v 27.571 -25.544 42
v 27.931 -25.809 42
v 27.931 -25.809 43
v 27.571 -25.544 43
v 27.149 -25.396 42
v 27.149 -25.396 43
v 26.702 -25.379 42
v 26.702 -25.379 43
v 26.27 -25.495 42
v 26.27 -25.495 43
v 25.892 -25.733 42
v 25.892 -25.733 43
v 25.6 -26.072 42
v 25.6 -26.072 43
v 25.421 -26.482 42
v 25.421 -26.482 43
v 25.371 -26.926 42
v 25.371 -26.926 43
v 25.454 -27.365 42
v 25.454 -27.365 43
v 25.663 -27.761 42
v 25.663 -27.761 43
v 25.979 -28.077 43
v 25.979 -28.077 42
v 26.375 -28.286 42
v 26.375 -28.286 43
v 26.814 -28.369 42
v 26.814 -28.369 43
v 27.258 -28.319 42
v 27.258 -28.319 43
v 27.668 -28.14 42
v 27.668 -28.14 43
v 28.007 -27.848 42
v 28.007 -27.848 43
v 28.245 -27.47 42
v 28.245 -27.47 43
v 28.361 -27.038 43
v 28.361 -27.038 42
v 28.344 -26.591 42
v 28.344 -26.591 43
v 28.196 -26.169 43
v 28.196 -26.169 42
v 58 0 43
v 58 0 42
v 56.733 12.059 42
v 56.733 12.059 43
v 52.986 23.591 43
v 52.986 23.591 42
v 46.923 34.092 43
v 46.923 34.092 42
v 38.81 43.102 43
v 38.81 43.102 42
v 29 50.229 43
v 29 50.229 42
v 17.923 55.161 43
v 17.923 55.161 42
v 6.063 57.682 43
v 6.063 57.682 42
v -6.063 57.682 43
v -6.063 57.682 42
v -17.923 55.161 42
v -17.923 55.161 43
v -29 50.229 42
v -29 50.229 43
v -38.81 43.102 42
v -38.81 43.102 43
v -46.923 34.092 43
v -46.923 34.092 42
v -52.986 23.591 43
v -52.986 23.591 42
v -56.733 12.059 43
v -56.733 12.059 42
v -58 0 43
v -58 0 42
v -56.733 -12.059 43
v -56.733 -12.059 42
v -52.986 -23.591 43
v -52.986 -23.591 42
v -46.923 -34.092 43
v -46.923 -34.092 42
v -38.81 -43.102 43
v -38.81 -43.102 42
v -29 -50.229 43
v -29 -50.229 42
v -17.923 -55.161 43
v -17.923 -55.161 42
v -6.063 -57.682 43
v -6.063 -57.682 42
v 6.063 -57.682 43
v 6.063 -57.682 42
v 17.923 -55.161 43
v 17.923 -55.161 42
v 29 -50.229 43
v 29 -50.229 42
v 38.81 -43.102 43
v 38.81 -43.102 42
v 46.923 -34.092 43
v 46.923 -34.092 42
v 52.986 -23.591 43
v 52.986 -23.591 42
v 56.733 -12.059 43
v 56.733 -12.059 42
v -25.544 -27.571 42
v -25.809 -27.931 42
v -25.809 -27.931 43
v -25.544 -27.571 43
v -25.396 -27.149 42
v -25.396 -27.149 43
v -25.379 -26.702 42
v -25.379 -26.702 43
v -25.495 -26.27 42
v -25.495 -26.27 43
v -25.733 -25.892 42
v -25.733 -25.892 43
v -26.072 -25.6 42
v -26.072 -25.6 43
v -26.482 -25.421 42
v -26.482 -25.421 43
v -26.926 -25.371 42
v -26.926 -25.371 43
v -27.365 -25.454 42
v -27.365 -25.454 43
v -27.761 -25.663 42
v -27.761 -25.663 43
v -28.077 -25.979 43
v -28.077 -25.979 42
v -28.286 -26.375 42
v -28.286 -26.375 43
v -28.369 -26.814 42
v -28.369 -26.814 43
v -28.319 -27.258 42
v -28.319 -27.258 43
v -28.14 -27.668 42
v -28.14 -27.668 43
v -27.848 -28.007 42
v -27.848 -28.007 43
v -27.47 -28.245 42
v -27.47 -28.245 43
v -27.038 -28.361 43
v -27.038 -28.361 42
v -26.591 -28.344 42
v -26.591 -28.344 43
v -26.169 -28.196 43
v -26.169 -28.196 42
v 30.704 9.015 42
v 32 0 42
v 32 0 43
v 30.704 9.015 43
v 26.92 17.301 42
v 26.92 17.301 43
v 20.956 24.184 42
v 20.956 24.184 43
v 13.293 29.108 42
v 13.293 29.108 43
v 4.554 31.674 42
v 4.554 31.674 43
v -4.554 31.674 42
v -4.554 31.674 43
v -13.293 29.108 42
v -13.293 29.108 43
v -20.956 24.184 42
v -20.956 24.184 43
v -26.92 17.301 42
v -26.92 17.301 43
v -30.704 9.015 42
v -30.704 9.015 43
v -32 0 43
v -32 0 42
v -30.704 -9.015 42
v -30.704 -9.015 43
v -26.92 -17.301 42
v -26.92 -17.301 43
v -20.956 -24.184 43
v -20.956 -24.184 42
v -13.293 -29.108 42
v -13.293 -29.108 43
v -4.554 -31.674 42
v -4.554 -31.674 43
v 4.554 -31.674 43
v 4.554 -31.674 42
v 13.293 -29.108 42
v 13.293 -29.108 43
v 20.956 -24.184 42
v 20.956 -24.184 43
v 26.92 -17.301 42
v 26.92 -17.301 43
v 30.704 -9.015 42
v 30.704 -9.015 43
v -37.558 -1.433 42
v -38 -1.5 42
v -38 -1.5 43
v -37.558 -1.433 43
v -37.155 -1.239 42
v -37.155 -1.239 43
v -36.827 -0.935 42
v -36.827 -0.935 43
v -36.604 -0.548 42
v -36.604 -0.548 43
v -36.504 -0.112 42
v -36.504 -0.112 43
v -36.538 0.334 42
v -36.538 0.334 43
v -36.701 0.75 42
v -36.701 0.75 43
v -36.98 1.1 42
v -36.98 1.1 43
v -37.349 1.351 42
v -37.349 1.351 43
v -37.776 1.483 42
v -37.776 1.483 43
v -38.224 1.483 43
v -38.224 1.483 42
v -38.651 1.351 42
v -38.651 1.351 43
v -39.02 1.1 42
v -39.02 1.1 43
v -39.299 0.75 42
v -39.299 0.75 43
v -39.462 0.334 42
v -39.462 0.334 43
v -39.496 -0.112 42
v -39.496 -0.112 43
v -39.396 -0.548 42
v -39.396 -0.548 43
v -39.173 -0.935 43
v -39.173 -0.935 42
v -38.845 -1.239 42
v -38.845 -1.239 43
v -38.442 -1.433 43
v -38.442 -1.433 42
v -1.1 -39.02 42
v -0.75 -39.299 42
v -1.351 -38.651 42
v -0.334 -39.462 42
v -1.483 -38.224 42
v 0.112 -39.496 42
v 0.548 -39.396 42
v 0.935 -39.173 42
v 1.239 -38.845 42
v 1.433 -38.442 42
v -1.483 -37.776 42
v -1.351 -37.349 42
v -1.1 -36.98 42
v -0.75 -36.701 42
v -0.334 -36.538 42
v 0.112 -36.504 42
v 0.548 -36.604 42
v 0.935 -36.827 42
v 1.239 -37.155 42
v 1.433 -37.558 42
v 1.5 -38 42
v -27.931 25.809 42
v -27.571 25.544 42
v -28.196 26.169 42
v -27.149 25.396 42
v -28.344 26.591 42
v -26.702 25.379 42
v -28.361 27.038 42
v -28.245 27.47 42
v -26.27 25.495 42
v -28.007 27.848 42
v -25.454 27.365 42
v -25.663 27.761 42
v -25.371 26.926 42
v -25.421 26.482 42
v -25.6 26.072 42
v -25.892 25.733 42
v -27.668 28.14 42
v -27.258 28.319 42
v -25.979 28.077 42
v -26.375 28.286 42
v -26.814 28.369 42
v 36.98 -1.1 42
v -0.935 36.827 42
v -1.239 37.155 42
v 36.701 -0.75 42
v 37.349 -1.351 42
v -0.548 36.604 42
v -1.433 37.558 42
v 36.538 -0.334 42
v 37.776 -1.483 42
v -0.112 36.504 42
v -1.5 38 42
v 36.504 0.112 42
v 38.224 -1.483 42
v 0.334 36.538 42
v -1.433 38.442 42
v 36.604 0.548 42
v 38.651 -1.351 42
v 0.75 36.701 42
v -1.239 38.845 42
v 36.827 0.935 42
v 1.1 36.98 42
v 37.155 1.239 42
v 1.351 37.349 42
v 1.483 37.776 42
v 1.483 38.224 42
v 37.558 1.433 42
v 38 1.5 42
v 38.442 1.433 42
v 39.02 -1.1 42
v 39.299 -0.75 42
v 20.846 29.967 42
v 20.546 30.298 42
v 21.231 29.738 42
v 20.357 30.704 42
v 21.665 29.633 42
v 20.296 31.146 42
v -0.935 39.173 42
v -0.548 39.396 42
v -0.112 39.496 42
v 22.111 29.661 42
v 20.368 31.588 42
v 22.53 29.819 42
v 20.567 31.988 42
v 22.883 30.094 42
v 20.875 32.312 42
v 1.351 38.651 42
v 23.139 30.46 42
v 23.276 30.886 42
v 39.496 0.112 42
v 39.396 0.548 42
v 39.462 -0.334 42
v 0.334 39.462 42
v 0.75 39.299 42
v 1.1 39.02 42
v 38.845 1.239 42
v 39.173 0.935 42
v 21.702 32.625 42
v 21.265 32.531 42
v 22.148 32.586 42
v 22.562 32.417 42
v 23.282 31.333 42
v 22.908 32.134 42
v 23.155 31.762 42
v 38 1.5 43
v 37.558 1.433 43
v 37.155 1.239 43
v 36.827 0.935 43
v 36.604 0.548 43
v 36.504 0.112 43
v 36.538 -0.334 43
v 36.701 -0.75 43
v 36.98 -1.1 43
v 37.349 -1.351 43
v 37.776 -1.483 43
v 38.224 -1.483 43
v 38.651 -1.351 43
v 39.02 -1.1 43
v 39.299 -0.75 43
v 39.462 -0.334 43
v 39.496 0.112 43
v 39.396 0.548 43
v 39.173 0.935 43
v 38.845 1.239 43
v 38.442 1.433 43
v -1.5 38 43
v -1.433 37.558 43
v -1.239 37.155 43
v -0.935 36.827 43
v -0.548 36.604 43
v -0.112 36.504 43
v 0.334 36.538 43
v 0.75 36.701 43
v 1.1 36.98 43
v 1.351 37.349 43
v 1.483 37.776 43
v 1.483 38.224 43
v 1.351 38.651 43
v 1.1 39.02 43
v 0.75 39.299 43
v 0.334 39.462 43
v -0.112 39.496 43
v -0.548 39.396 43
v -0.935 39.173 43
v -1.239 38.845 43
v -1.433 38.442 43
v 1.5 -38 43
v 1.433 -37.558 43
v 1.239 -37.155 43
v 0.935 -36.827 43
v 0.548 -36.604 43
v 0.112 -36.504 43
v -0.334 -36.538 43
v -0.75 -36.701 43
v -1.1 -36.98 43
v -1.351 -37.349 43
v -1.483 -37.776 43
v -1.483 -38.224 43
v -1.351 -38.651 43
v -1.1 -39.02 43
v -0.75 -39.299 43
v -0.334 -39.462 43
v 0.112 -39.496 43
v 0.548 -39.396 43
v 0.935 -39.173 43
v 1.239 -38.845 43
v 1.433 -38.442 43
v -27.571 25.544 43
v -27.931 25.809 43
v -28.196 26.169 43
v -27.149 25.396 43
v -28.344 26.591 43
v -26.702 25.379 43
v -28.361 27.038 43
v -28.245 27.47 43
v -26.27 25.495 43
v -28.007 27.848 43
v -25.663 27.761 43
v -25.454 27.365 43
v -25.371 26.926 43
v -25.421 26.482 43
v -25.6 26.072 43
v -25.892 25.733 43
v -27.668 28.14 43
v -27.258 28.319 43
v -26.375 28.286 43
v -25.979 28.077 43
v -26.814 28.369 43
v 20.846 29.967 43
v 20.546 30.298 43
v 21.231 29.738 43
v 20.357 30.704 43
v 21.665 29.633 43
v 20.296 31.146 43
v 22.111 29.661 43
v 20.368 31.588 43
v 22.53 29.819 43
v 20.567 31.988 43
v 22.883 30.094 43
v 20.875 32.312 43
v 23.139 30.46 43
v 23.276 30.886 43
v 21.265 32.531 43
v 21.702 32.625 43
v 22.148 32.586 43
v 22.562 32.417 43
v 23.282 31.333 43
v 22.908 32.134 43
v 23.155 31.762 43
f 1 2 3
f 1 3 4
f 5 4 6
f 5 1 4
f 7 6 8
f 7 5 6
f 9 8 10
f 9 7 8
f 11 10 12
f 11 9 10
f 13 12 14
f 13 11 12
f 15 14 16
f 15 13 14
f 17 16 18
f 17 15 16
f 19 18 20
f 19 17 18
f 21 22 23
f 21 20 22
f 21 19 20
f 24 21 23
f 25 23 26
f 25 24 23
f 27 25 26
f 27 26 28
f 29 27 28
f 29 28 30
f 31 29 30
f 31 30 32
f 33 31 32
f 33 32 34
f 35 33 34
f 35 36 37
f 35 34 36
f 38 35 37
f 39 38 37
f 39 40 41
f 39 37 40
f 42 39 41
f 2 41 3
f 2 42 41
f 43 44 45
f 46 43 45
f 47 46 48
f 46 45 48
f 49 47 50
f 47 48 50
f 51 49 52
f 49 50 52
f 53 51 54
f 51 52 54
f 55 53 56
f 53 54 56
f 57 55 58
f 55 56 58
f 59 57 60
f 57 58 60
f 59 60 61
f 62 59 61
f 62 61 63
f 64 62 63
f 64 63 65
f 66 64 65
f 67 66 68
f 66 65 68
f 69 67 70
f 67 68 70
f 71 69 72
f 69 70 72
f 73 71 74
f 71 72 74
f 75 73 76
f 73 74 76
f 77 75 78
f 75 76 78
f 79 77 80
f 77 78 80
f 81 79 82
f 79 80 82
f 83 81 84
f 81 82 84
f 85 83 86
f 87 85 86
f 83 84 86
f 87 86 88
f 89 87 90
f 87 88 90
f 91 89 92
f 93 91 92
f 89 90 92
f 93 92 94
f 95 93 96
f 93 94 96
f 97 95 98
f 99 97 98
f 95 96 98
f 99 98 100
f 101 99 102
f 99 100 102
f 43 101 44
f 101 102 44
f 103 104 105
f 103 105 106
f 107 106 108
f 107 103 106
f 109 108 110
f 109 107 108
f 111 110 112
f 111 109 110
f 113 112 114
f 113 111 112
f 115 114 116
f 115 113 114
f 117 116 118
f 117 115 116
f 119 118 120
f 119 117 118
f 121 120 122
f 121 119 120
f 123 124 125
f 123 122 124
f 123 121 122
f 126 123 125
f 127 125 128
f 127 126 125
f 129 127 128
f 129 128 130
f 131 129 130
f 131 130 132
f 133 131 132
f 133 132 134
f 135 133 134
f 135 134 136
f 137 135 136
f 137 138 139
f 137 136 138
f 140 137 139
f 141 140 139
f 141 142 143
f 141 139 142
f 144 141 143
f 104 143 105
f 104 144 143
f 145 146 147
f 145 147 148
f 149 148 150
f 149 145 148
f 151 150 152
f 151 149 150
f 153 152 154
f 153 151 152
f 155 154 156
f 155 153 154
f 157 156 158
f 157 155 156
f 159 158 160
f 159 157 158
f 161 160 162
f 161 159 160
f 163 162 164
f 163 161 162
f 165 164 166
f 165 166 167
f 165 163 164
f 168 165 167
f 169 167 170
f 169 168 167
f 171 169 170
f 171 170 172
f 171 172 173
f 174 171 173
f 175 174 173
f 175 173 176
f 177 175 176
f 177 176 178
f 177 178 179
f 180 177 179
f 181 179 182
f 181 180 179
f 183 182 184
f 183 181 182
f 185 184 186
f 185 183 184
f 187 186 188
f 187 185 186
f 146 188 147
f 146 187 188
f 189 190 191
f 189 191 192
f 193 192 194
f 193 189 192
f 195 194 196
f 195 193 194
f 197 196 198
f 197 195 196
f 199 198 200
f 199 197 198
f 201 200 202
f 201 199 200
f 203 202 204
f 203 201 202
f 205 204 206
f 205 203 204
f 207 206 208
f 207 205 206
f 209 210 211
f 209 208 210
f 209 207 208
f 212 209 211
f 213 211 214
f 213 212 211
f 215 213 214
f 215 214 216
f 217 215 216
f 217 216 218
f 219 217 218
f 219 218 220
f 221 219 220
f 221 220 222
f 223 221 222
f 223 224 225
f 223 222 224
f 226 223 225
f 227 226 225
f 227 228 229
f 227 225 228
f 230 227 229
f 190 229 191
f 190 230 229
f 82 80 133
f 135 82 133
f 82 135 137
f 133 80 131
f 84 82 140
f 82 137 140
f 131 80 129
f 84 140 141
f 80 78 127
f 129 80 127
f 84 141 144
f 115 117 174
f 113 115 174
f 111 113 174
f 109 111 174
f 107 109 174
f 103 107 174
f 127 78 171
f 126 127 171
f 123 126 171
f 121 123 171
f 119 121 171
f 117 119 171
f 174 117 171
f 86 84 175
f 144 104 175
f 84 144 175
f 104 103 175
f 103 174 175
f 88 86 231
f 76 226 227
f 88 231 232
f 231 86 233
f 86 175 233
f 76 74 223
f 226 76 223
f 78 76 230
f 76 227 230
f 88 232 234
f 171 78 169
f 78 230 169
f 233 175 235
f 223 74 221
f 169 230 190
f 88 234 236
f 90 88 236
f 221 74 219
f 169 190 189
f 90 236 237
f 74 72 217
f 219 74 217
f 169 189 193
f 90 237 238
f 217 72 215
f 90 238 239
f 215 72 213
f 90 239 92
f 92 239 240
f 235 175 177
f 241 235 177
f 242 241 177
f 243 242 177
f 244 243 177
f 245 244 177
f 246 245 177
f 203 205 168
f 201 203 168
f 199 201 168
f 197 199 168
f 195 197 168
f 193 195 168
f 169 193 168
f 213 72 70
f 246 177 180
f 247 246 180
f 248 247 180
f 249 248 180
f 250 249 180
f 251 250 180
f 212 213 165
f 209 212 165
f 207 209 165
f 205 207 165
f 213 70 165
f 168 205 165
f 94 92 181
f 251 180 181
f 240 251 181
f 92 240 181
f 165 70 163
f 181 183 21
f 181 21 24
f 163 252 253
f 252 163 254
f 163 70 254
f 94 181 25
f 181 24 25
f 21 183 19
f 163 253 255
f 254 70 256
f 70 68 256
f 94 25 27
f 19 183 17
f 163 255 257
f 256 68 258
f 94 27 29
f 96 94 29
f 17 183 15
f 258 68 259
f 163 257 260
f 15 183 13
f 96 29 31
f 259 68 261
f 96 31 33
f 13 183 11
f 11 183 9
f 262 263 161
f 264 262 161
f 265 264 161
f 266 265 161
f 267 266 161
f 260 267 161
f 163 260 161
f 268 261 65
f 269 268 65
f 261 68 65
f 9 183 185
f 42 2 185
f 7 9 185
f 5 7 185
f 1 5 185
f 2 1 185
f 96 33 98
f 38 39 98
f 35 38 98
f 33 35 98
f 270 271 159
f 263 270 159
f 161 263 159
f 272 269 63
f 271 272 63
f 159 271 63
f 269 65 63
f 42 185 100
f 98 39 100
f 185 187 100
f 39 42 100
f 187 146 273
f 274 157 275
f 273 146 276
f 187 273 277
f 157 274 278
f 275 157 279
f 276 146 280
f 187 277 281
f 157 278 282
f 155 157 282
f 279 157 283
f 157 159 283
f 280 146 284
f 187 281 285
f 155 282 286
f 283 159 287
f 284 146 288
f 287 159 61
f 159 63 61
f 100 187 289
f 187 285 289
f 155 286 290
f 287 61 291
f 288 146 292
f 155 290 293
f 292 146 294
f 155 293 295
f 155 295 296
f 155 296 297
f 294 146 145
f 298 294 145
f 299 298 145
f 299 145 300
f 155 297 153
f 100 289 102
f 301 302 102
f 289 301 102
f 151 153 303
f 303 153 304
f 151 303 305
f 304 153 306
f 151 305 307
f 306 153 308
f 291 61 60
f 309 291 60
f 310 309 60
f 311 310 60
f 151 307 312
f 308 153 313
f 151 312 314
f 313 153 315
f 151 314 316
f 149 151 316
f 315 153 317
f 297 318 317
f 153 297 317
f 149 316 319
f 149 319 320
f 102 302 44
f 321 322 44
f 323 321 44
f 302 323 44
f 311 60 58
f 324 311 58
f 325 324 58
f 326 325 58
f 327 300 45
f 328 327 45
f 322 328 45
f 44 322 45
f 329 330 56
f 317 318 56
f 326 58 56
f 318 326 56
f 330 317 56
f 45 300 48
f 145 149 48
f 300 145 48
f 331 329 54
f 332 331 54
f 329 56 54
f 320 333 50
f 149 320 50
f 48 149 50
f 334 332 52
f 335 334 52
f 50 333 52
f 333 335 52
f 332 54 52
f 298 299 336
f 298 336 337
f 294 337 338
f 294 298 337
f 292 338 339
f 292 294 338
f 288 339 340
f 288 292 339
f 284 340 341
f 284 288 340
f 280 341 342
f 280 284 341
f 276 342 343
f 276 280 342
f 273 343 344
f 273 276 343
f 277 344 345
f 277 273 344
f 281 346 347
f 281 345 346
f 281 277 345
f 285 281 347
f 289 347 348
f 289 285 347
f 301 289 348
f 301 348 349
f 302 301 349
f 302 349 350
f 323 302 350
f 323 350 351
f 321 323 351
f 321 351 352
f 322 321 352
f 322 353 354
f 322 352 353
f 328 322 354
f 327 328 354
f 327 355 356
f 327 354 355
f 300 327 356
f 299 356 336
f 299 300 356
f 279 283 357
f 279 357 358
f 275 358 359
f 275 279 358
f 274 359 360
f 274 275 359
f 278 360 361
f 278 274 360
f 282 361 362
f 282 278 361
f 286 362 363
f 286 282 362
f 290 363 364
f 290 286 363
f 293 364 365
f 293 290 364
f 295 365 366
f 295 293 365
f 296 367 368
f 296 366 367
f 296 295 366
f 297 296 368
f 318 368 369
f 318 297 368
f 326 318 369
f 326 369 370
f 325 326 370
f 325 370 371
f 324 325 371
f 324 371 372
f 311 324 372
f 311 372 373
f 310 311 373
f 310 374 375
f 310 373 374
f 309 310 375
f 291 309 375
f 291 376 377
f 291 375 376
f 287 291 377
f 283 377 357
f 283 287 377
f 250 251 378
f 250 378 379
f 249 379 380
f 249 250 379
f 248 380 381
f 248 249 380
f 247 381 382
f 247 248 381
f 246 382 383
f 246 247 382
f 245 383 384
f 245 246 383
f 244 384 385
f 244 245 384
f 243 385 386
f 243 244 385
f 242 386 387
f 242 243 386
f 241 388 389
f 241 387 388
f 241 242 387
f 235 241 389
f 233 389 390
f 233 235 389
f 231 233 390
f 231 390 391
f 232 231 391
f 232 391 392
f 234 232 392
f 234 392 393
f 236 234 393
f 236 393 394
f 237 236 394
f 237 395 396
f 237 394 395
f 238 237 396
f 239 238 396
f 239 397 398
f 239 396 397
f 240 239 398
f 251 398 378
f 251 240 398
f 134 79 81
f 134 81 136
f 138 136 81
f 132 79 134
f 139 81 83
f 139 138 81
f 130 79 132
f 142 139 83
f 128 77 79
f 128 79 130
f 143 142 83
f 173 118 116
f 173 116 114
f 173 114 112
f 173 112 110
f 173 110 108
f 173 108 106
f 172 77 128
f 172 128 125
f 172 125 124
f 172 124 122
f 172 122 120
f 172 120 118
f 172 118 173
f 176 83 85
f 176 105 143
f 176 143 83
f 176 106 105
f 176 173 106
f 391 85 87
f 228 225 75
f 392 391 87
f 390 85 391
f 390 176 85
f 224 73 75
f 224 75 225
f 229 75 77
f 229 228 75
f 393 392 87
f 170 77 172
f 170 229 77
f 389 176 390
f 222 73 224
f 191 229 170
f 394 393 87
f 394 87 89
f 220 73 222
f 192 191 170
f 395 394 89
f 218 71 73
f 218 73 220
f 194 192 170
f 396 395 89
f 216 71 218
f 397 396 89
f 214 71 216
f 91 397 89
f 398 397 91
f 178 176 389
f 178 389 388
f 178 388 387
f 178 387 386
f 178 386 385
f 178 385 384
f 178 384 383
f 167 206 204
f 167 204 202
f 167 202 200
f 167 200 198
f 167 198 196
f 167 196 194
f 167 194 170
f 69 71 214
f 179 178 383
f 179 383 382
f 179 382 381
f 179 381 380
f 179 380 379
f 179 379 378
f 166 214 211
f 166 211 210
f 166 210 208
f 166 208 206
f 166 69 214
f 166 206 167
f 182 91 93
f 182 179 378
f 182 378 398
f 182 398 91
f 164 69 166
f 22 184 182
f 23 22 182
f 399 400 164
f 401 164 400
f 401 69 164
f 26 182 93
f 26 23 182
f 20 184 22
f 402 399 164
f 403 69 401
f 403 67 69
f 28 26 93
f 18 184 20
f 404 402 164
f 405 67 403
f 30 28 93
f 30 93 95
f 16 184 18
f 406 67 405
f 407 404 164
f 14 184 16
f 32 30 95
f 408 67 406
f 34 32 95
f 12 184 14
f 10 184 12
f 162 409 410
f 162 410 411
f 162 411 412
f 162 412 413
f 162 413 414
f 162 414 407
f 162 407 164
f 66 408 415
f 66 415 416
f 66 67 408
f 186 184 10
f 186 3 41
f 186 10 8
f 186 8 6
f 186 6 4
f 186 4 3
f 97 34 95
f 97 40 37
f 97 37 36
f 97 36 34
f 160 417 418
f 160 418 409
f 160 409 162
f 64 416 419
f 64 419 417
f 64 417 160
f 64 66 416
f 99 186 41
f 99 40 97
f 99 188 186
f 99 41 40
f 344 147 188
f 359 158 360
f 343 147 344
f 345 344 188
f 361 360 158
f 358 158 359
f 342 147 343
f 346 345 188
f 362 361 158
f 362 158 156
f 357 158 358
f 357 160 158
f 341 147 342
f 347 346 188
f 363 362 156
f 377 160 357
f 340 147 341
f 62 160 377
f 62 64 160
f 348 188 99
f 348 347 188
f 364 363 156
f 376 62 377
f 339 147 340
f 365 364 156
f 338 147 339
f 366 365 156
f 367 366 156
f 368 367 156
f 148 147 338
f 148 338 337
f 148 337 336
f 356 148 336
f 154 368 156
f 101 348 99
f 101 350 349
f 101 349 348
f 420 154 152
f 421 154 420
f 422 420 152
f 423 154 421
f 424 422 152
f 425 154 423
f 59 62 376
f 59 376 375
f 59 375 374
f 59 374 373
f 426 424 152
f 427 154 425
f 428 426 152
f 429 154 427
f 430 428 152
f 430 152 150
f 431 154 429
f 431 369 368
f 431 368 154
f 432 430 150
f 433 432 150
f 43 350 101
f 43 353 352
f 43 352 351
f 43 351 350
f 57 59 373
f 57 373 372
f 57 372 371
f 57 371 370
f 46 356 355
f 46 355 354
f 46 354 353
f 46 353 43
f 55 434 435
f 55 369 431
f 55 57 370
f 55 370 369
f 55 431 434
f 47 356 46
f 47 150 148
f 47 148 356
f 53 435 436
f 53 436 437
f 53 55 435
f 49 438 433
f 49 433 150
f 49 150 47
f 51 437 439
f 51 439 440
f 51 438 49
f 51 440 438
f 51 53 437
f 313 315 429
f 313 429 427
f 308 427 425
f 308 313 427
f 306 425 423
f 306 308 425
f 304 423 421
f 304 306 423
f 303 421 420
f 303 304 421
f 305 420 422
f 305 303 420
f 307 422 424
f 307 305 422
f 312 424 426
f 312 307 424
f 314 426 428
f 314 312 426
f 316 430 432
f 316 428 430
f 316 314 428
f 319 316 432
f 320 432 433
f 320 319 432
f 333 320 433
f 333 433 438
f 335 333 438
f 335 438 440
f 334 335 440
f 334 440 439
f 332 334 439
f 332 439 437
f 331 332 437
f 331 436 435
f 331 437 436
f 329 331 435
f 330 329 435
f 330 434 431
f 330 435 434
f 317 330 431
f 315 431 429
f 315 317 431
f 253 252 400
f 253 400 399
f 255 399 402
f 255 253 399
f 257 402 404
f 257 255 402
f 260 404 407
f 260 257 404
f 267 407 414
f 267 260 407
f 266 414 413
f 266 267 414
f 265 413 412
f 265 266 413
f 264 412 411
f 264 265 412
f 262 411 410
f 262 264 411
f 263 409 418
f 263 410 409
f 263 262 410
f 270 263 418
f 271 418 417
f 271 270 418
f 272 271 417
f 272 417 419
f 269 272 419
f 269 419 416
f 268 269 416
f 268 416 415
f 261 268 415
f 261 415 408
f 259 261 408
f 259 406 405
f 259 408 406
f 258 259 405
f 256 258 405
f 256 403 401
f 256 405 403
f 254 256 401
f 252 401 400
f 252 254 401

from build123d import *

# Parameters (mm, degrees)
CYLINDER2163_R               = 1.5
CYLINDER2163_DEPTH           = 100
CYLINDER2164_R               = 1.5
CYLINDER2164_DEPTH           = 100
CYLINDER2164_PLACEMENT_ANGLE = 145
CYLINDER2165_R               = 1.5
CYLINDER2165_DEPTH           = 100
CYLINDER2166_R               = 1.5
CYLINDER2166_DEPTH           = 100
CYLINDER2166_PLACEMENT_ANGLE = 225
CYLINDER2167_R               = 1.5
CYLINDER2167_DEPTH           = 100
CYLINDER2168_R               = 1.5
CYLINDER2168_DEPTH           = 100
CYLINDER2168_PLACEMENT_ANGLE = 45
CYLINDER2162_R               = 1.5
CYLINDER2162_DEPTH           = 100
CYLINDER2161_R               = 1.5
CYLINDER2161_DEPTH           = 100
CYLINDER2161_PLACEMENT_ANGLE = 45
TUBE089_R                    = 58
TUBE089_R_2                  = 32
TUBE089_DEPTH                = 1


with BuildPart() as v_lec2163:
    # Cylinder2163 → Cylinder2163 (new body)
    with BuildSketch(Plane(origin=(38, 0, 0), x_dir=(0, 1, 0), z_dir=(0, 0, 1))):
        Circle(CYLINDER2163_R)
    extrude(amount=CYLINDER2163_DEPTH)


with BuildPart() as v_lec2164:
    # Cylinder2164 → Cylinder2164 (new body)
    with BuildSketch(Plane.XY):
        Circle(CYLINDER2164_R)
    extrude(amount=CYLINDER2164_DEPTH)


with BuildPart() as v_lec2164_1:
    # Cylinder2164 placement: moved
    add(v_lec2164.part.moved(Location((21.795905, 31.127778, 0))).rotate(Axis((21.795905, 31.127778, 0), (0, 0, 1)), CYLINDER2164_PLACEMENT_ANGLE))


with BuildPart() as v_lec2165:
    # Cylinder2165 → Cylinder2165 (new body)
    with BuildSketch(Plane(origin=(0, 38, 0), x_dir=(-1, 0, 0), z_dir=(0, 0, 1))):
        Circle(CYLINDER2165_R)
    extrude(amount=CYLINDER2165_DEPTH)


with BuildPart() as v_lec2166:
    # Cylinder2166 → Cylinder2166 (new body)
    with BuildSketch(Plane.XY):
        Circle(CYLINDER2166_R)
    extrude(amount=CYLINDER2166_DEPTH)


with BuildPart() as v_lec2166_1:
    # Cylinder2166 placement: moved
    add(v_lec2166.part.moved(Location((-26.870058, 26.870058, 0))).rotate(Axis((-26.870058, 26.870058, 0), (0, 0, 1)), CYLINDER2166_PLACEMENT_ANGLE))


with BuildPart() as v_lec2167:
    # Cylinder2167 → Cylinder2167 (new body)
    with BuildSketch(Plane(origin=(-38, 0, 0), x_dir=(0, -1, 0), z_dir=(0, 0, 1))):
        Circle(CYLINDER2167_R)
    extrude(amount=CYLINDER2167_DEPTH)


with BuildPart() as v_lec2168:
    # Cylinder2168 → Cylinder2168 (new body)
    with BuildSketch(Plane.XY):
        Circle(CYLINDER2168_R)
    extrude(amount=CYLINDER2168_DEPTH)


with BuildPart() as v_lec2168_1:
    # Cylinder2168 placement: moved
    add(v_lec2168.part.moved(Location((-26.870058, -26.870058, 0))).rotate(Axis((-26.870058, -26.870058, 0), (0, 0, -1)), CYLINDER2168_PLACEMENT_ANGLE))


with BuildPart() as v_lec2162:
    # Cylinder2162 → Cylinder2162 (new body)
    with BuildSketch(Plane(origin=(0, -38, 0), x_dir=(1, 0, 0), z_dir=(0, 0, 1))):
        Circle(CYLINDER2162_R)
    extrude(amount=CYLINDER2162_DEPTH)


with BuildPart() as compound1127:
    # Cylinder2161 → Cylinder2161 (new body)
    with BuildSketch(Plane.XY):
        Circle(CYLINDER2161_R)
    extrude(amount=CYLINDER2161_DEPTH)


with BuildPart() as compound1127_1:
    # Cylinder2161 placement: moved
    add(compound1127.part.moved(Location((26.870058, -26.870058, 0))).rotate(Axis((26.870058, -26.870058, 0), (0, 0, 1)), CYLINDER2161_PLACEMENT_ANGLE))

    # Compound1127: union Válec2163, Válec2164, Válec2165, Válec2166, Válec2167, Válec2168, Válec2162
    add(v_lec2163.part)
    add(v_lec2164_1.part)
    add(v_lec2165.part)
    add(v_lec2166_1.part)
    add(v_lec2167.part)
    add(v_lec2168_1.part)
    add(v_lec2162.part)


with BuildPart() as cut715:
    # Tube089 → Tube089 (new body)
    with BuildSketch(Plane.XY.offset(42)):
        Circle(TUBE089_R)
        Circle(TUBE089_R_2, mode=Mode.SUBTRACT)
    extrude(amount=TUBE089_DEPTH)

    # Cut715: cut Compound1127
    add(compound1127_1.part, mode=Mode.SUBTRACT)


solid = cut715.part
